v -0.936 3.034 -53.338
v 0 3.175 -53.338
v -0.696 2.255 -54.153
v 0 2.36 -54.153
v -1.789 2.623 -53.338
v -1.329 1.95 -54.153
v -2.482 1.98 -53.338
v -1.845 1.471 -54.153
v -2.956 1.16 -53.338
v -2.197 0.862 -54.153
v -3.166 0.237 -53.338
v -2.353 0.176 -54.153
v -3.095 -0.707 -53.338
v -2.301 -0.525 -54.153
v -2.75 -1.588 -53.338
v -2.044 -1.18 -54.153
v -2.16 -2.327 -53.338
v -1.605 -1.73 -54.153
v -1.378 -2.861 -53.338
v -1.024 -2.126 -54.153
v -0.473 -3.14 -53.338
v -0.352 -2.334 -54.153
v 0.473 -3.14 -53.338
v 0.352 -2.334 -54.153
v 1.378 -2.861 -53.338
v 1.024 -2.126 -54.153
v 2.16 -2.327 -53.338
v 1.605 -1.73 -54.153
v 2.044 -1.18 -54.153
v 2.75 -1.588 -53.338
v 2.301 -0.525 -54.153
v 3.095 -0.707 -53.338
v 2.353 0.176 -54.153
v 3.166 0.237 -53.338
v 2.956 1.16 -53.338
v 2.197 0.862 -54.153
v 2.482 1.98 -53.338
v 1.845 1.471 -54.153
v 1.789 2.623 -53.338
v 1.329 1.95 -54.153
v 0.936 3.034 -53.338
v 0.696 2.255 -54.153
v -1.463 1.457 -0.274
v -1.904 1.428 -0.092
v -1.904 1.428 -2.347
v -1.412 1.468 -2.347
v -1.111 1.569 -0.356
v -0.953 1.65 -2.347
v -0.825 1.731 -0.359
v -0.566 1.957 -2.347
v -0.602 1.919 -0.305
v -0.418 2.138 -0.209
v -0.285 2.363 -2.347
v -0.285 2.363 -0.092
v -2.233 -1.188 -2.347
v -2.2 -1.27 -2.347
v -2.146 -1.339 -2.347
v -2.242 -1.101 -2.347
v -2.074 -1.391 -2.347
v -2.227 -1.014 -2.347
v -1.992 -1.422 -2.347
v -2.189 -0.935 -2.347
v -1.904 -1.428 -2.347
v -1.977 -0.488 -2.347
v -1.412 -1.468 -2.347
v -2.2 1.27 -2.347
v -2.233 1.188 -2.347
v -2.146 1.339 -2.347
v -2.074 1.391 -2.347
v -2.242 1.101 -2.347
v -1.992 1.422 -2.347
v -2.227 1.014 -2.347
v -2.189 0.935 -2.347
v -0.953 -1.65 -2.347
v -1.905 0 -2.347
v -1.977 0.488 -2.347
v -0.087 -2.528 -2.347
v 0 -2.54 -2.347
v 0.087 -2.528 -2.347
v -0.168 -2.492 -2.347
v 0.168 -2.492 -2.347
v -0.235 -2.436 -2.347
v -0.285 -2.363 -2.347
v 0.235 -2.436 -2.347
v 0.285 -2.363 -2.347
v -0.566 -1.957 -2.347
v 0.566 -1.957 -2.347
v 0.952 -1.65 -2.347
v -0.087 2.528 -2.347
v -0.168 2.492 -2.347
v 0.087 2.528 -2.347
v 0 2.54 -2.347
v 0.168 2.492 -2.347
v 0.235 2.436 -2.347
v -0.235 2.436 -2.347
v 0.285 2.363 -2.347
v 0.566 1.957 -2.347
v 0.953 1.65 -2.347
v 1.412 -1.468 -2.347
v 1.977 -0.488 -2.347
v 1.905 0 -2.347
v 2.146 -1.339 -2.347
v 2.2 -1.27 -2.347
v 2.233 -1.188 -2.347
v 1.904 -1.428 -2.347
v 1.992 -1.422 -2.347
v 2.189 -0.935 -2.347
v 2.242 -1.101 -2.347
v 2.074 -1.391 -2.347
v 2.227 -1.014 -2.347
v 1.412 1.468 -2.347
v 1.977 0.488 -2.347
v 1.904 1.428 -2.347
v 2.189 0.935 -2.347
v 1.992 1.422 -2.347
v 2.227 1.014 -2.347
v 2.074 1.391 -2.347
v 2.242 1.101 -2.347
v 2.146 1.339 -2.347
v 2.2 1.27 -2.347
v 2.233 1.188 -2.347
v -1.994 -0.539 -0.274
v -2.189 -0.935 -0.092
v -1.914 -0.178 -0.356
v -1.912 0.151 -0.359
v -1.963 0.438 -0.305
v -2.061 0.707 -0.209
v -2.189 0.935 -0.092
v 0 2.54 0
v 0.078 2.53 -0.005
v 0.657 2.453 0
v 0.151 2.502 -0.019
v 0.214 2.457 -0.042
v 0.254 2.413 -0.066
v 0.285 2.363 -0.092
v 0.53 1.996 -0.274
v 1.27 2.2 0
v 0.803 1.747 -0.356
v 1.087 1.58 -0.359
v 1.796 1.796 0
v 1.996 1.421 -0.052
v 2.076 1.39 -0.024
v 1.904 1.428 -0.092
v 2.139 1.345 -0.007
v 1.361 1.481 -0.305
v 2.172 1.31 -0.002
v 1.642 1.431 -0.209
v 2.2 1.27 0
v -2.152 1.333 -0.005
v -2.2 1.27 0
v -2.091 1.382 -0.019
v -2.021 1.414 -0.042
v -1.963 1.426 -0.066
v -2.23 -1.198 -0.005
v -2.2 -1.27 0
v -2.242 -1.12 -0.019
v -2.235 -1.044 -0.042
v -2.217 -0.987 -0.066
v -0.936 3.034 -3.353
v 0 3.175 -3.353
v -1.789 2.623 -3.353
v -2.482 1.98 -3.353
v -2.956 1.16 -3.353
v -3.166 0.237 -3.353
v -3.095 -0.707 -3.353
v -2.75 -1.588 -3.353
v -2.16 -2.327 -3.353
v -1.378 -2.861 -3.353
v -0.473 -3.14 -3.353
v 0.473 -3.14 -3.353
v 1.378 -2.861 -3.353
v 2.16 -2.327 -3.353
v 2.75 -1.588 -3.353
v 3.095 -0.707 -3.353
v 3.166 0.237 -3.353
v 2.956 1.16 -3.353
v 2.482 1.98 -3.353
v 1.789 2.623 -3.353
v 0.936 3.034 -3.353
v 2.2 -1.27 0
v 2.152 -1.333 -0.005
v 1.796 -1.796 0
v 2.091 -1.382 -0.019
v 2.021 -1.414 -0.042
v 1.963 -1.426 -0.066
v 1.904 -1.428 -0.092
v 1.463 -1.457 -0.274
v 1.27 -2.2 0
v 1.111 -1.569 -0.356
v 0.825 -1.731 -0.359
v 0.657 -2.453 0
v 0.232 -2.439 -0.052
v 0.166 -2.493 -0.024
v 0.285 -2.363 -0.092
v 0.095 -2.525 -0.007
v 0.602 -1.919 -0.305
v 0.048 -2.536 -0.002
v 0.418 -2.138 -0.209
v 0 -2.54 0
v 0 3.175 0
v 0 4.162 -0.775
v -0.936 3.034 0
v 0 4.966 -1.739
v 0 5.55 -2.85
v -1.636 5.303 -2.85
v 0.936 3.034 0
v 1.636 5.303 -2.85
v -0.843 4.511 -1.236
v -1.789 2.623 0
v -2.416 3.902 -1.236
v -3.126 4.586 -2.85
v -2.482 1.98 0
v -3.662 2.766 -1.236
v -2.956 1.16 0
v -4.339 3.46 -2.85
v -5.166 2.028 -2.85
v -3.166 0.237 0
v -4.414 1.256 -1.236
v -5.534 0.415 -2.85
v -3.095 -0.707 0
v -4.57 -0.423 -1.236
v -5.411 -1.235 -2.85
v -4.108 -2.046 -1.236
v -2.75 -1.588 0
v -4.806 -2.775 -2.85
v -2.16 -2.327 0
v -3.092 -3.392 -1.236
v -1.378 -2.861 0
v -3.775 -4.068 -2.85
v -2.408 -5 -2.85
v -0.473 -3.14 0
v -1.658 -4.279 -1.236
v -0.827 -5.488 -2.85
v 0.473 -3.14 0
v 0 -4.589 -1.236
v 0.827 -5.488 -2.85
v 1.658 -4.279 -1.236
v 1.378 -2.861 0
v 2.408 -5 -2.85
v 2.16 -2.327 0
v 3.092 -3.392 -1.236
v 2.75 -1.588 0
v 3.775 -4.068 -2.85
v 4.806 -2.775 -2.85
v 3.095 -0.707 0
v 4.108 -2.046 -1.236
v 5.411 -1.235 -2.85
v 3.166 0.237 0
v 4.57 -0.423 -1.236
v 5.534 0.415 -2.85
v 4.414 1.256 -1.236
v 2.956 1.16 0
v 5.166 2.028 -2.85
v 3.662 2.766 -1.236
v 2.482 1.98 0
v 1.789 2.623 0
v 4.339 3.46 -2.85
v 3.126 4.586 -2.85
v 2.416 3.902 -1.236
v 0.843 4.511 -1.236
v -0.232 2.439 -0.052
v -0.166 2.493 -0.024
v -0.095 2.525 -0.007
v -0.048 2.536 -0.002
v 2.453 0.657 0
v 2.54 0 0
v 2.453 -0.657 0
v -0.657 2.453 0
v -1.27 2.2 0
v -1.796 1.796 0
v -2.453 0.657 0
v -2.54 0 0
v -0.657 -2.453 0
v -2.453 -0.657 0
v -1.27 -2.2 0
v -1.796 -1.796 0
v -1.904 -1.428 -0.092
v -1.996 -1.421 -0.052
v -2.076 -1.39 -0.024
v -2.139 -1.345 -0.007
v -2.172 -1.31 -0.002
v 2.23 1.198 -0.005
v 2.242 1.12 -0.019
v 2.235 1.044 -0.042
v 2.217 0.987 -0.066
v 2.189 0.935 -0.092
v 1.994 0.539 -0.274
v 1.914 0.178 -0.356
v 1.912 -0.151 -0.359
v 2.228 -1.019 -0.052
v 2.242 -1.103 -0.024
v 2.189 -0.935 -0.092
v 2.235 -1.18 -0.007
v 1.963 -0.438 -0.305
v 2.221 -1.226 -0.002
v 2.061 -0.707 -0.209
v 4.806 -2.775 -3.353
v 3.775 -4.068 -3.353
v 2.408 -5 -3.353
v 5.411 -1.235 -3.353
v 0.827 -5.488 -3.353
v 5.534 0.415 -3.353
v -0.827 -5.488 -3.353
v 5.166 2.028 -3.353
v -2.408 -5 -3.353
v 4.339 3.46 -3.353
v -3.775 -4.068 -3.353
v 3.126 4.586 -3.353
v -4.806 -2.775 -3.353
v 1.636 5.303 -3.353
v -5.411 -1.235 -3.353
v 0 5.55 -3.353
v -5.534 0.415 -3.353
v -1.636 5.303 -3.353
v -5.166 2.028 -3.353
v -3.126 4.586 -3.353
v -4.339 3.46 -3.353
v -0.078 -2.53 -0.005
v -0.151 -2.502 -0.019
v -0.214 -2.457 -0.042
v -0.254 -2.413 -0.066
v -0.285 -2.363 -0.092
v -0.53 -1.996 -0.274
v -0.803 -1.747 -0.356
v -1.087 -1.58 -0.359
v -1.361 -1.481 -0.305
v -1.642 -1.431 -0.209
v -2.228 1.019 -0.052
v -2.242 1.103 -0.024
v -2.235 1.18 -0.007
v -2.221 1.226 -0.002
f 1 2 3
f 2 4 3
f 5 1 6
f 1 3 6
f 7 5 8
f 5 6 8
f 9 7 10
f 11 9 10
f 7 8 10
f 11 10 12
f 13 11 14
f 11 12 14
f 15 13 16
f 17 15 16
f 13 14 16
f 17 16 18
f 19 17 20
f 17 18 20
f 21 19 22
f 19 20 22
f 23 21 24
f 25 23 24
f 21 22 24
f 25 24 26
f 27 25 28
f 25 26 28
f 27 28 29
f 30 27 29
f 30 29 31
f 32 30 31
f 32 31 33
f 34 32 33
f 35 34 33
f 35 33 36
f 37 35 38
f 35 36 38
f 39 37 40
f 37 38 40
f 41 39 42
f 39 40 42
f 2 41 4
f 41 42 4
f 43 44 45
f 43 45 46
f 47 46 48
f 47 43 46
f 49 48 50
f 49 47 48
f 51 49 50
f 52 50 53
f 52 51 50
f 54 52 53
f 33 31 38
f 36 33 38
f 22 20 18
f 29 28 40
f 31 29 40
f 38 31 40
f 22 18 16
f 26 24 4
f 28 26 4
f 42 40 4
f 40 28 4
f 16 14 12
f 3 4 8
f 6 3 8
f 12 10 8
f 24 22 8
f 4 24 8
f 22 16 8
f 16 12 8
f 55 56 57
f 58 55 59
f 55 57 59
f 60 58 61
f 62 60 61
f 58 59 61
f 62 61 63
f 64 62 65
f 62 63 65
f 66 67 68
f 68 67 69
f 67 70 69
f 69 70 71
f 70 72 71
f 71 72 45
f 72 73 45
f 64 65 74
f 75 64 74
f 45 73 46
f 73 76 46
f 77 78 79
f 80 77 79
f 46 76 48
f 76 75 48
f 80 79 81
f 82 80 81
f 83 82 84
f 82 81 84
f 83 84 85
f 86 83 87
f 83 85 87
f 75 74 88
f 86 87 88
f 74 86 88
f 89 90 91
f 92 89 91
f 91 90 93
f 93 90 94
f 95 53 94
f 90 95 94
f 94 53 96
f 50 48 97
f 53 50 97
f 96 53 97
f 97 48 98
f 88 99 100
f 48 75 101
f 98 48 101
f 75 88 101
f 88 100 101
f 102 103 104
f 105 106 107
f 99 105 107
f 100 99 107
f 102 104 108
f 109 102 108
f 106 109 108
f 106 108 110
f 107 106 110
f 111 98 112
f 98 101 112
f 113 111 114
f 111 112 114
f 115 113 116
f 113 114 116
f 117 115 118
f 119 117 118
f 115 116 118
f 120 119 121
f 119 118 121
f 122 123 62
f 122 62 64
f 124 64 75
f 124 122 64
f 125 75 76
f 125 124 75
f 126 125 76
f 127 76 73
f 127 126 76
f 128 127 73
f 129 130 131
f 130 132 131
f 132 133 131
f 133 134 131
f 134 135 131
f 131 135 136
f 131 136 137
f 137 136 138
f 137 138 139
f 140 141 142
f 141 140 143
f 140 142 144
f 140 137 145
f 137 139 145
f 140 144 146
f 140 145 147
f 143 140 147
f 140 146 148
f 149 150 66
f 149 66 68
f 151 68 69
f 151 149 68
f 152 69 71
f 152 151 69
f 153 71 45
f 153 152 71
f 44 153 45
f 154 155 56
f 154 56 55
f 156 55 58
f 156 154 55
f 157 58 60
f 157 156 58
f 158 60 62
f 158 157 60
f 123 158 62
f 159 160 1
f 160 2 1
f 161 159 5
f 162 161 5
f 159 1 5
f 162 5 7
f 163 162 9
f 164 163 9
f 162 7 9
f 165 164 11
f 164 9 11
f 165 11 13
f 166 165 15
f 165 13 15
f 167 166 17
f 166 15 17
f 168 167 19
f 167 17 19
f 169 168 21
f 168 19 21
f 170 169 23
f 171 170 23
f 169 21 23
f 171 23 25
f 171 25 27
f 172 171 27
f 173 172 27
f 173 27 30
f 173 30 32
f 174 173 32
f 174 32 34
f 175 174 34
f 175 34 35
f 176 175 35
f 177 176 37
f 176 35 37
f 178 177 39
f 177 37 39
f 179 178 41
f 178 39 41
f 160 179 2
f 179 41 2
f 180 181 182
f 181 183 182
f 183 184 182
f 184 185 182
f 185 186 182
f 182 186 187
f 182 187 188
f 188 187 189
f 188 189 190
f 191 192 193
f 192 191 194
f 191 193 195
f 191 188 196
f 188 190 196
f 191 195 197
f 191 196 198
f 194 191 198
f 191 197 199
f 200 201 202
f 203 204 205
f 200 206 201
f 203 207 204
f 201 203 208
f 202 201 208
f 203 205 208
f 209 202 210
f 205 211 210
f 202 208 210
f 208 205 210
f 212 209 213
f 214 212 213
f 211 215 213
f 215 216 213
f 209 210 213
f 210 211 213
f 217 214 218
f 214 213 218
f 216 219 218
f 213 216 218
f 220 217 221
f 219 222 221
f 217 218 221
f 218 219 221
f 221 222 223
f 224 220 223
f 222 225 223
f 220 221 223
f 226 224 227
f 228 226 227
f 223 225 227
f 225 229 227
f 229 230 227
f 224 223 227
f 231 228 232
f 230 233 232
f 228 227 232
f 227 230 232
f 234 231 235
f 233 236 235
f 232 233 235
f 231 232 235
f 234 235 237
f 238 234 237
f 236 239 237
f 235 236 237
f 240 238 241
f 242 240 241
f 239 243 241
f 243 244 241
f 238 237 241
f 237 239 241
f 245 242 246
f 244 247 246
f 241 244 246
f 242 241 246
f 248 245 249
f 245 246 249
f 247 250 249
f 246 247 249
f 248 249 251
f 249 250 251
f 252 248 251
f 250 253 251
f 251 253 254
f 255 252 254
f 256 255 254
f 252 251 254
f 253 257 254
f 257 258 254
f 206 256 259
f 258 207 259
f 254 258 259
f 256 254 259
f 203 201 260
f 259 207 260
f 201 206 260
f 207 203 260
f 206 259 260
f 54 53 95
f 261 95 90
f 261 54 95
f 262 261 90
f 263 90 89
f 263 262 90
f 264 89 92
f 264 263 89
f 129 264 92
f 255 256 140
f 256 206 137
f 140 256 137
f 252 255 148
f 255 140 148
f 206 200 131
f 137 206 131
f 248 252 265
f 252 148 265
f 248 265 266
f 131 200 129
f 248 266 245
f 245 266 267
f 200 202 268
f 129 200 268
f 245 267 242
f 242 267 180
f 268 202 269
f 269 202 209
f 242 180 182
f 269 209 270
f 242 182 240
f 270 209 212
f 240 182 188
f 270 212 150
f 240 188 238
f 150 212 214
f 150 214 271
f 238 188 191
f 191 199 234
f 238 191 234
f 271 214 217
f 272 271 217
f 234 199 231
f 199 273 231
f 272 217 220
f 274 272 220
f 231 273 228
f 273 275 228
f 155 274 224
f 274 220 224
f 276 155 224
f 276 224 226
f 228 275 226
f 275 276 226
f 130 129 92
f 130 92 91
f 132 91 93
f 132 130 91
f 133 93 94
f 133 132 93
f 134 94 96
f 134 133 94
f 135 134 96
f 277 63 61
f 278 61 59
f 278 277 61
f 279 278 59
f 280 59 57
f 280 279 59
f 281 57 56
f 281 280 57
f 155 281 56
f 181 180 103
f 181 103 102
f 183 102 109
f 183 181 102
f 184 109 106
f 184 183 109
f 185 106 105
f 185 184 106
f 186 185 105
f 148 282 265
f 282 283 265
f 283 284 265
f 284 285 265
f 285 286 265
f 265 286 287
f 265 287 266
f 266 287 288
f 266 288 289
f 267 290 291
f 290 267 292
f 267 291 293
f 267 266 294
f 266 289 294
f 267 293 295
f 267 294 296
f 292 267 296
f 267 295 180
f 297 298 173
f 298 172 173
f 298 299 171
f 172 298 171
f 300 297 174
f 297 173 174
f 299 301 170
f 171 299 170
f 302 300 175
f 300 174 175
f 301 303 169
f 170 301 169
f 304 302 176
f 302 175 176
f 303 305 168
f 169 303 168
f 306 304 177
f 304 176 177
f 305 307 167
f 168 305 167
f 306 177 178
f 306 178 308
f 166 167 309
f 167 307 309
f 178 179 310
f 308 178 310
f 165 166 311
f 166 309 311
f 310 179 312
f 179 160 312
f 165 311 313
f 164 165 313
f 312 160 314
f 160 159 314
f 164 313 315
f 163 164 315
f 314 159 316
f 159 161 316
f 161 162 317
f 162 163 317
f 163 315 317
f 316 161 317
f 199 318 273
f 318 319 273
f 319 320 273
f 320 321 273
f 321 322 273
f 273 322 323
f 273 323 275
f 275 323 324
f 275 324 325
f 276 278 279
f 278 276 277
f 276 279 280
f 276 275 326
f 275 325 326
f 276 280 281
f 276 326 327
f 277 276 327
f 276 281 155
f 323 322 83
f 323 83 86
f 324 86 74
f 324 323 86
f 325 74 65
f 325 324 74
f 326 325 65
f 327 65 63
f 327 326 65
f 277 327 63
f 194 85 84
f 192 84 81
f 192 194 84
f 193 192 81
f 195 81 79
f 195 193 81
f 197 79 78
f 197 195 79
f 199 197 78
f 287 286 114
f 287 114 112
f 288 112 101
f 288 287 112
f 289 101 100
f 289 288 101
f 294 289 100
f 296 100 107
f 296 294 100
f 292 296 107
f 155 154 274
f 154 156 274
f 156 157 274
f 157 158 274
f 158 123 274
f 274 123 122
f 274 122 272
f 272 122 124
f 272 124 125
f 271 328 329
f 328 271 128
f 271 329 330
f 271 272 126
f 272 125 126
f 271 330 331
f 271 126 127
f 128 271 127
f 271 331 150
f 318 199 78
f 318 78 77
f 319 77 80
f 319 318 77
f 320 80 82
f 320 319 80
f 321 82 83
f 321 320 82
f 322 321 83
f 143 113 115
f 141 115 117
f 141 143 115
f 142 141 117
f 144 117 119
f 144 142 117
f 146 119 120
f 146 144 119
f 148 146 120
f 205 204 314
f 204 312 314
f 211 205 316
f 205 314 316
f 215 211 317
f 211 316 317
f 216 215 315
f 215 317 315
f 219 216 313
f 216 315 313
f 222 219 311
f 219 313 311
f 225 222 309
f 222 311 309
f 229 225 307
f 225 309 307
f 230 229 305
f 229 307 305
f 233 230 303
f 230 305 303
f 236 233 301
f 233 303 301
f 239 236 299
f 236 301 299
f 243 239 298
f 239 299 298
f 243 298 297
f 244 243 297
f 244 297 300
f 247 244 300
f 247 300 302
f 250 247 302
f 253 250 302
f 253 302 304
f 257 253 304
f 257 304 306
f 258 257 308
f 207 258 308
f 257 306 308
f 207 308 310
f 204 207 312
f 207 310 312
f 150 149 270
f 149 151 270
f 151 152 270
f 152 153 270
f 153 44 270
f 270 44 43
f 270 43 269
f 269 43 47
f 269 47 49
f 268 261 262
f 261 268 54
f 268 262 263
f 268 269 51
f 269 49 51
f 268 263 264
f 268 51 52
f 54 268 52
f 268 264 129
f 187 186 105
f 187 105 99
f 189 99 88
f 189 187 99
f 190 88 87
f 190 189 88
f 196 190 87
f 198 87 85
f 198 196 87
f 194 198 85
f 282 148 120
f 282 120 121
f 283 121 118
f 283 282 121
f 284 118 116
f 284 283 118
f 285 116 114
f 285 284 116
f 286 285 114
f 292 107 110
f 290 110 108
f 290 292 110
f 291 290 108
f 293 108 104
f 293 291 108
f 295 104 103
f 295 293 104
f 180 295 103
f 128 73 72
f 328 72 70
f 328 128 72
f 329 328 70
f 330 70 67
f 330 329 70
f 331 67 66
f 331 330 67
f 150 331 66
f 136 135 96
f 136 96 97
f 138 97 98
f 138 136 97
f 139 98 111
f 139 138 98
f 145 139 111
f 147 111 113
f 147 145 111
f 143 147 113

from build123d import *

# Parameters (mm, degrees)
CUT_EXTRUDE1_DEPTH = 2.34696
CIRPATTERN1_COUNT  = 6


with BuildPart() as part:
    # Sketch3 → Revolve1 (revolve)
    with BuildSketch(Plane(origin=(0, 0, 0), x_dir=(0, 0, -1), z_dir=(1, 0, 0))):
        with BuildLine():
            Line((2.84988, 5.5499), (3.3528, 5.5499))
            Line((3.3528, 5.5499), (3.3528, 3.175))
            Line((3.3528, 3.175), (53.337781533, 3.175))
            Line((53.337781533, 3.175), (54.1528, 2.359981533))
            Line((54.1528, 2.359981533), (54.1528, 0))
            Line((54.1528, 0), (0, 0))
            Line((0, 0), (0, 3.175))
            ThreePointArc((0, 3.175), (1.235921075, 4.58927271), (2.84988, 5.5499))
        make_face()
    revolve(axis=Axis((0, 0, -54.1528), (0, 0, 1)))

    # Sketch4 → Cut-Extrude1 (cut)
    with BuildSketch(Plane.XY):
        with BuildLine():
            Line((0, 0), (-2.199704526, -1.27))
            ThreePointArc((-2.199704526, -1.27), (-2.242070202, -1.100823133), (-2.188690187, -0.934792301))
            ThreePointArc((-2.188690187, -0.934792301), (-1.905, 0), (-2.188690187, 0.934792301))
            ThreePointArc((-2.188690187, 0.934792301), (-2.242070202, 1.100823133), (-2.199704526, 1.27))
            Line((-2.199704526, 1.27), (0, 0))
        make_face()
    cut_extrude1 = extrude(amount=-CUT_EXTRUDE1_DEPTH, mode=Mode.SUBTRACT)

    # CirPattern1: Cut-Extrude1 ×6 about axis
    cirpattern1_axis = Axis((0, 0, -54.1528), (0, 0, 1))
    for i in range(1, CIRPATTERN1_COUNT):
        add(cut_extrude1.rotate(cirpattern1_axis, i * 360 / CIRPATTERN1_COUNT), mode=Mode.SUBTRACT)

    # Cut-Extrude2 cone 1 section (through the dimple's axis) → Cut-Extrude2 (revolve, cut)
    with BuildSketch(Plane(origin=(0, 0, 0), x_dir=(0, -1, 0), z_dir=(1, 0, 0))):
        Polygon((0, 0), (2.54, 0), (0, 1.466469684), align=None)
    revolve(axis=Axis((0, 0, 0), (0, 0, -1)), mode=Mode.SUBTRACT)


solid = part.part
